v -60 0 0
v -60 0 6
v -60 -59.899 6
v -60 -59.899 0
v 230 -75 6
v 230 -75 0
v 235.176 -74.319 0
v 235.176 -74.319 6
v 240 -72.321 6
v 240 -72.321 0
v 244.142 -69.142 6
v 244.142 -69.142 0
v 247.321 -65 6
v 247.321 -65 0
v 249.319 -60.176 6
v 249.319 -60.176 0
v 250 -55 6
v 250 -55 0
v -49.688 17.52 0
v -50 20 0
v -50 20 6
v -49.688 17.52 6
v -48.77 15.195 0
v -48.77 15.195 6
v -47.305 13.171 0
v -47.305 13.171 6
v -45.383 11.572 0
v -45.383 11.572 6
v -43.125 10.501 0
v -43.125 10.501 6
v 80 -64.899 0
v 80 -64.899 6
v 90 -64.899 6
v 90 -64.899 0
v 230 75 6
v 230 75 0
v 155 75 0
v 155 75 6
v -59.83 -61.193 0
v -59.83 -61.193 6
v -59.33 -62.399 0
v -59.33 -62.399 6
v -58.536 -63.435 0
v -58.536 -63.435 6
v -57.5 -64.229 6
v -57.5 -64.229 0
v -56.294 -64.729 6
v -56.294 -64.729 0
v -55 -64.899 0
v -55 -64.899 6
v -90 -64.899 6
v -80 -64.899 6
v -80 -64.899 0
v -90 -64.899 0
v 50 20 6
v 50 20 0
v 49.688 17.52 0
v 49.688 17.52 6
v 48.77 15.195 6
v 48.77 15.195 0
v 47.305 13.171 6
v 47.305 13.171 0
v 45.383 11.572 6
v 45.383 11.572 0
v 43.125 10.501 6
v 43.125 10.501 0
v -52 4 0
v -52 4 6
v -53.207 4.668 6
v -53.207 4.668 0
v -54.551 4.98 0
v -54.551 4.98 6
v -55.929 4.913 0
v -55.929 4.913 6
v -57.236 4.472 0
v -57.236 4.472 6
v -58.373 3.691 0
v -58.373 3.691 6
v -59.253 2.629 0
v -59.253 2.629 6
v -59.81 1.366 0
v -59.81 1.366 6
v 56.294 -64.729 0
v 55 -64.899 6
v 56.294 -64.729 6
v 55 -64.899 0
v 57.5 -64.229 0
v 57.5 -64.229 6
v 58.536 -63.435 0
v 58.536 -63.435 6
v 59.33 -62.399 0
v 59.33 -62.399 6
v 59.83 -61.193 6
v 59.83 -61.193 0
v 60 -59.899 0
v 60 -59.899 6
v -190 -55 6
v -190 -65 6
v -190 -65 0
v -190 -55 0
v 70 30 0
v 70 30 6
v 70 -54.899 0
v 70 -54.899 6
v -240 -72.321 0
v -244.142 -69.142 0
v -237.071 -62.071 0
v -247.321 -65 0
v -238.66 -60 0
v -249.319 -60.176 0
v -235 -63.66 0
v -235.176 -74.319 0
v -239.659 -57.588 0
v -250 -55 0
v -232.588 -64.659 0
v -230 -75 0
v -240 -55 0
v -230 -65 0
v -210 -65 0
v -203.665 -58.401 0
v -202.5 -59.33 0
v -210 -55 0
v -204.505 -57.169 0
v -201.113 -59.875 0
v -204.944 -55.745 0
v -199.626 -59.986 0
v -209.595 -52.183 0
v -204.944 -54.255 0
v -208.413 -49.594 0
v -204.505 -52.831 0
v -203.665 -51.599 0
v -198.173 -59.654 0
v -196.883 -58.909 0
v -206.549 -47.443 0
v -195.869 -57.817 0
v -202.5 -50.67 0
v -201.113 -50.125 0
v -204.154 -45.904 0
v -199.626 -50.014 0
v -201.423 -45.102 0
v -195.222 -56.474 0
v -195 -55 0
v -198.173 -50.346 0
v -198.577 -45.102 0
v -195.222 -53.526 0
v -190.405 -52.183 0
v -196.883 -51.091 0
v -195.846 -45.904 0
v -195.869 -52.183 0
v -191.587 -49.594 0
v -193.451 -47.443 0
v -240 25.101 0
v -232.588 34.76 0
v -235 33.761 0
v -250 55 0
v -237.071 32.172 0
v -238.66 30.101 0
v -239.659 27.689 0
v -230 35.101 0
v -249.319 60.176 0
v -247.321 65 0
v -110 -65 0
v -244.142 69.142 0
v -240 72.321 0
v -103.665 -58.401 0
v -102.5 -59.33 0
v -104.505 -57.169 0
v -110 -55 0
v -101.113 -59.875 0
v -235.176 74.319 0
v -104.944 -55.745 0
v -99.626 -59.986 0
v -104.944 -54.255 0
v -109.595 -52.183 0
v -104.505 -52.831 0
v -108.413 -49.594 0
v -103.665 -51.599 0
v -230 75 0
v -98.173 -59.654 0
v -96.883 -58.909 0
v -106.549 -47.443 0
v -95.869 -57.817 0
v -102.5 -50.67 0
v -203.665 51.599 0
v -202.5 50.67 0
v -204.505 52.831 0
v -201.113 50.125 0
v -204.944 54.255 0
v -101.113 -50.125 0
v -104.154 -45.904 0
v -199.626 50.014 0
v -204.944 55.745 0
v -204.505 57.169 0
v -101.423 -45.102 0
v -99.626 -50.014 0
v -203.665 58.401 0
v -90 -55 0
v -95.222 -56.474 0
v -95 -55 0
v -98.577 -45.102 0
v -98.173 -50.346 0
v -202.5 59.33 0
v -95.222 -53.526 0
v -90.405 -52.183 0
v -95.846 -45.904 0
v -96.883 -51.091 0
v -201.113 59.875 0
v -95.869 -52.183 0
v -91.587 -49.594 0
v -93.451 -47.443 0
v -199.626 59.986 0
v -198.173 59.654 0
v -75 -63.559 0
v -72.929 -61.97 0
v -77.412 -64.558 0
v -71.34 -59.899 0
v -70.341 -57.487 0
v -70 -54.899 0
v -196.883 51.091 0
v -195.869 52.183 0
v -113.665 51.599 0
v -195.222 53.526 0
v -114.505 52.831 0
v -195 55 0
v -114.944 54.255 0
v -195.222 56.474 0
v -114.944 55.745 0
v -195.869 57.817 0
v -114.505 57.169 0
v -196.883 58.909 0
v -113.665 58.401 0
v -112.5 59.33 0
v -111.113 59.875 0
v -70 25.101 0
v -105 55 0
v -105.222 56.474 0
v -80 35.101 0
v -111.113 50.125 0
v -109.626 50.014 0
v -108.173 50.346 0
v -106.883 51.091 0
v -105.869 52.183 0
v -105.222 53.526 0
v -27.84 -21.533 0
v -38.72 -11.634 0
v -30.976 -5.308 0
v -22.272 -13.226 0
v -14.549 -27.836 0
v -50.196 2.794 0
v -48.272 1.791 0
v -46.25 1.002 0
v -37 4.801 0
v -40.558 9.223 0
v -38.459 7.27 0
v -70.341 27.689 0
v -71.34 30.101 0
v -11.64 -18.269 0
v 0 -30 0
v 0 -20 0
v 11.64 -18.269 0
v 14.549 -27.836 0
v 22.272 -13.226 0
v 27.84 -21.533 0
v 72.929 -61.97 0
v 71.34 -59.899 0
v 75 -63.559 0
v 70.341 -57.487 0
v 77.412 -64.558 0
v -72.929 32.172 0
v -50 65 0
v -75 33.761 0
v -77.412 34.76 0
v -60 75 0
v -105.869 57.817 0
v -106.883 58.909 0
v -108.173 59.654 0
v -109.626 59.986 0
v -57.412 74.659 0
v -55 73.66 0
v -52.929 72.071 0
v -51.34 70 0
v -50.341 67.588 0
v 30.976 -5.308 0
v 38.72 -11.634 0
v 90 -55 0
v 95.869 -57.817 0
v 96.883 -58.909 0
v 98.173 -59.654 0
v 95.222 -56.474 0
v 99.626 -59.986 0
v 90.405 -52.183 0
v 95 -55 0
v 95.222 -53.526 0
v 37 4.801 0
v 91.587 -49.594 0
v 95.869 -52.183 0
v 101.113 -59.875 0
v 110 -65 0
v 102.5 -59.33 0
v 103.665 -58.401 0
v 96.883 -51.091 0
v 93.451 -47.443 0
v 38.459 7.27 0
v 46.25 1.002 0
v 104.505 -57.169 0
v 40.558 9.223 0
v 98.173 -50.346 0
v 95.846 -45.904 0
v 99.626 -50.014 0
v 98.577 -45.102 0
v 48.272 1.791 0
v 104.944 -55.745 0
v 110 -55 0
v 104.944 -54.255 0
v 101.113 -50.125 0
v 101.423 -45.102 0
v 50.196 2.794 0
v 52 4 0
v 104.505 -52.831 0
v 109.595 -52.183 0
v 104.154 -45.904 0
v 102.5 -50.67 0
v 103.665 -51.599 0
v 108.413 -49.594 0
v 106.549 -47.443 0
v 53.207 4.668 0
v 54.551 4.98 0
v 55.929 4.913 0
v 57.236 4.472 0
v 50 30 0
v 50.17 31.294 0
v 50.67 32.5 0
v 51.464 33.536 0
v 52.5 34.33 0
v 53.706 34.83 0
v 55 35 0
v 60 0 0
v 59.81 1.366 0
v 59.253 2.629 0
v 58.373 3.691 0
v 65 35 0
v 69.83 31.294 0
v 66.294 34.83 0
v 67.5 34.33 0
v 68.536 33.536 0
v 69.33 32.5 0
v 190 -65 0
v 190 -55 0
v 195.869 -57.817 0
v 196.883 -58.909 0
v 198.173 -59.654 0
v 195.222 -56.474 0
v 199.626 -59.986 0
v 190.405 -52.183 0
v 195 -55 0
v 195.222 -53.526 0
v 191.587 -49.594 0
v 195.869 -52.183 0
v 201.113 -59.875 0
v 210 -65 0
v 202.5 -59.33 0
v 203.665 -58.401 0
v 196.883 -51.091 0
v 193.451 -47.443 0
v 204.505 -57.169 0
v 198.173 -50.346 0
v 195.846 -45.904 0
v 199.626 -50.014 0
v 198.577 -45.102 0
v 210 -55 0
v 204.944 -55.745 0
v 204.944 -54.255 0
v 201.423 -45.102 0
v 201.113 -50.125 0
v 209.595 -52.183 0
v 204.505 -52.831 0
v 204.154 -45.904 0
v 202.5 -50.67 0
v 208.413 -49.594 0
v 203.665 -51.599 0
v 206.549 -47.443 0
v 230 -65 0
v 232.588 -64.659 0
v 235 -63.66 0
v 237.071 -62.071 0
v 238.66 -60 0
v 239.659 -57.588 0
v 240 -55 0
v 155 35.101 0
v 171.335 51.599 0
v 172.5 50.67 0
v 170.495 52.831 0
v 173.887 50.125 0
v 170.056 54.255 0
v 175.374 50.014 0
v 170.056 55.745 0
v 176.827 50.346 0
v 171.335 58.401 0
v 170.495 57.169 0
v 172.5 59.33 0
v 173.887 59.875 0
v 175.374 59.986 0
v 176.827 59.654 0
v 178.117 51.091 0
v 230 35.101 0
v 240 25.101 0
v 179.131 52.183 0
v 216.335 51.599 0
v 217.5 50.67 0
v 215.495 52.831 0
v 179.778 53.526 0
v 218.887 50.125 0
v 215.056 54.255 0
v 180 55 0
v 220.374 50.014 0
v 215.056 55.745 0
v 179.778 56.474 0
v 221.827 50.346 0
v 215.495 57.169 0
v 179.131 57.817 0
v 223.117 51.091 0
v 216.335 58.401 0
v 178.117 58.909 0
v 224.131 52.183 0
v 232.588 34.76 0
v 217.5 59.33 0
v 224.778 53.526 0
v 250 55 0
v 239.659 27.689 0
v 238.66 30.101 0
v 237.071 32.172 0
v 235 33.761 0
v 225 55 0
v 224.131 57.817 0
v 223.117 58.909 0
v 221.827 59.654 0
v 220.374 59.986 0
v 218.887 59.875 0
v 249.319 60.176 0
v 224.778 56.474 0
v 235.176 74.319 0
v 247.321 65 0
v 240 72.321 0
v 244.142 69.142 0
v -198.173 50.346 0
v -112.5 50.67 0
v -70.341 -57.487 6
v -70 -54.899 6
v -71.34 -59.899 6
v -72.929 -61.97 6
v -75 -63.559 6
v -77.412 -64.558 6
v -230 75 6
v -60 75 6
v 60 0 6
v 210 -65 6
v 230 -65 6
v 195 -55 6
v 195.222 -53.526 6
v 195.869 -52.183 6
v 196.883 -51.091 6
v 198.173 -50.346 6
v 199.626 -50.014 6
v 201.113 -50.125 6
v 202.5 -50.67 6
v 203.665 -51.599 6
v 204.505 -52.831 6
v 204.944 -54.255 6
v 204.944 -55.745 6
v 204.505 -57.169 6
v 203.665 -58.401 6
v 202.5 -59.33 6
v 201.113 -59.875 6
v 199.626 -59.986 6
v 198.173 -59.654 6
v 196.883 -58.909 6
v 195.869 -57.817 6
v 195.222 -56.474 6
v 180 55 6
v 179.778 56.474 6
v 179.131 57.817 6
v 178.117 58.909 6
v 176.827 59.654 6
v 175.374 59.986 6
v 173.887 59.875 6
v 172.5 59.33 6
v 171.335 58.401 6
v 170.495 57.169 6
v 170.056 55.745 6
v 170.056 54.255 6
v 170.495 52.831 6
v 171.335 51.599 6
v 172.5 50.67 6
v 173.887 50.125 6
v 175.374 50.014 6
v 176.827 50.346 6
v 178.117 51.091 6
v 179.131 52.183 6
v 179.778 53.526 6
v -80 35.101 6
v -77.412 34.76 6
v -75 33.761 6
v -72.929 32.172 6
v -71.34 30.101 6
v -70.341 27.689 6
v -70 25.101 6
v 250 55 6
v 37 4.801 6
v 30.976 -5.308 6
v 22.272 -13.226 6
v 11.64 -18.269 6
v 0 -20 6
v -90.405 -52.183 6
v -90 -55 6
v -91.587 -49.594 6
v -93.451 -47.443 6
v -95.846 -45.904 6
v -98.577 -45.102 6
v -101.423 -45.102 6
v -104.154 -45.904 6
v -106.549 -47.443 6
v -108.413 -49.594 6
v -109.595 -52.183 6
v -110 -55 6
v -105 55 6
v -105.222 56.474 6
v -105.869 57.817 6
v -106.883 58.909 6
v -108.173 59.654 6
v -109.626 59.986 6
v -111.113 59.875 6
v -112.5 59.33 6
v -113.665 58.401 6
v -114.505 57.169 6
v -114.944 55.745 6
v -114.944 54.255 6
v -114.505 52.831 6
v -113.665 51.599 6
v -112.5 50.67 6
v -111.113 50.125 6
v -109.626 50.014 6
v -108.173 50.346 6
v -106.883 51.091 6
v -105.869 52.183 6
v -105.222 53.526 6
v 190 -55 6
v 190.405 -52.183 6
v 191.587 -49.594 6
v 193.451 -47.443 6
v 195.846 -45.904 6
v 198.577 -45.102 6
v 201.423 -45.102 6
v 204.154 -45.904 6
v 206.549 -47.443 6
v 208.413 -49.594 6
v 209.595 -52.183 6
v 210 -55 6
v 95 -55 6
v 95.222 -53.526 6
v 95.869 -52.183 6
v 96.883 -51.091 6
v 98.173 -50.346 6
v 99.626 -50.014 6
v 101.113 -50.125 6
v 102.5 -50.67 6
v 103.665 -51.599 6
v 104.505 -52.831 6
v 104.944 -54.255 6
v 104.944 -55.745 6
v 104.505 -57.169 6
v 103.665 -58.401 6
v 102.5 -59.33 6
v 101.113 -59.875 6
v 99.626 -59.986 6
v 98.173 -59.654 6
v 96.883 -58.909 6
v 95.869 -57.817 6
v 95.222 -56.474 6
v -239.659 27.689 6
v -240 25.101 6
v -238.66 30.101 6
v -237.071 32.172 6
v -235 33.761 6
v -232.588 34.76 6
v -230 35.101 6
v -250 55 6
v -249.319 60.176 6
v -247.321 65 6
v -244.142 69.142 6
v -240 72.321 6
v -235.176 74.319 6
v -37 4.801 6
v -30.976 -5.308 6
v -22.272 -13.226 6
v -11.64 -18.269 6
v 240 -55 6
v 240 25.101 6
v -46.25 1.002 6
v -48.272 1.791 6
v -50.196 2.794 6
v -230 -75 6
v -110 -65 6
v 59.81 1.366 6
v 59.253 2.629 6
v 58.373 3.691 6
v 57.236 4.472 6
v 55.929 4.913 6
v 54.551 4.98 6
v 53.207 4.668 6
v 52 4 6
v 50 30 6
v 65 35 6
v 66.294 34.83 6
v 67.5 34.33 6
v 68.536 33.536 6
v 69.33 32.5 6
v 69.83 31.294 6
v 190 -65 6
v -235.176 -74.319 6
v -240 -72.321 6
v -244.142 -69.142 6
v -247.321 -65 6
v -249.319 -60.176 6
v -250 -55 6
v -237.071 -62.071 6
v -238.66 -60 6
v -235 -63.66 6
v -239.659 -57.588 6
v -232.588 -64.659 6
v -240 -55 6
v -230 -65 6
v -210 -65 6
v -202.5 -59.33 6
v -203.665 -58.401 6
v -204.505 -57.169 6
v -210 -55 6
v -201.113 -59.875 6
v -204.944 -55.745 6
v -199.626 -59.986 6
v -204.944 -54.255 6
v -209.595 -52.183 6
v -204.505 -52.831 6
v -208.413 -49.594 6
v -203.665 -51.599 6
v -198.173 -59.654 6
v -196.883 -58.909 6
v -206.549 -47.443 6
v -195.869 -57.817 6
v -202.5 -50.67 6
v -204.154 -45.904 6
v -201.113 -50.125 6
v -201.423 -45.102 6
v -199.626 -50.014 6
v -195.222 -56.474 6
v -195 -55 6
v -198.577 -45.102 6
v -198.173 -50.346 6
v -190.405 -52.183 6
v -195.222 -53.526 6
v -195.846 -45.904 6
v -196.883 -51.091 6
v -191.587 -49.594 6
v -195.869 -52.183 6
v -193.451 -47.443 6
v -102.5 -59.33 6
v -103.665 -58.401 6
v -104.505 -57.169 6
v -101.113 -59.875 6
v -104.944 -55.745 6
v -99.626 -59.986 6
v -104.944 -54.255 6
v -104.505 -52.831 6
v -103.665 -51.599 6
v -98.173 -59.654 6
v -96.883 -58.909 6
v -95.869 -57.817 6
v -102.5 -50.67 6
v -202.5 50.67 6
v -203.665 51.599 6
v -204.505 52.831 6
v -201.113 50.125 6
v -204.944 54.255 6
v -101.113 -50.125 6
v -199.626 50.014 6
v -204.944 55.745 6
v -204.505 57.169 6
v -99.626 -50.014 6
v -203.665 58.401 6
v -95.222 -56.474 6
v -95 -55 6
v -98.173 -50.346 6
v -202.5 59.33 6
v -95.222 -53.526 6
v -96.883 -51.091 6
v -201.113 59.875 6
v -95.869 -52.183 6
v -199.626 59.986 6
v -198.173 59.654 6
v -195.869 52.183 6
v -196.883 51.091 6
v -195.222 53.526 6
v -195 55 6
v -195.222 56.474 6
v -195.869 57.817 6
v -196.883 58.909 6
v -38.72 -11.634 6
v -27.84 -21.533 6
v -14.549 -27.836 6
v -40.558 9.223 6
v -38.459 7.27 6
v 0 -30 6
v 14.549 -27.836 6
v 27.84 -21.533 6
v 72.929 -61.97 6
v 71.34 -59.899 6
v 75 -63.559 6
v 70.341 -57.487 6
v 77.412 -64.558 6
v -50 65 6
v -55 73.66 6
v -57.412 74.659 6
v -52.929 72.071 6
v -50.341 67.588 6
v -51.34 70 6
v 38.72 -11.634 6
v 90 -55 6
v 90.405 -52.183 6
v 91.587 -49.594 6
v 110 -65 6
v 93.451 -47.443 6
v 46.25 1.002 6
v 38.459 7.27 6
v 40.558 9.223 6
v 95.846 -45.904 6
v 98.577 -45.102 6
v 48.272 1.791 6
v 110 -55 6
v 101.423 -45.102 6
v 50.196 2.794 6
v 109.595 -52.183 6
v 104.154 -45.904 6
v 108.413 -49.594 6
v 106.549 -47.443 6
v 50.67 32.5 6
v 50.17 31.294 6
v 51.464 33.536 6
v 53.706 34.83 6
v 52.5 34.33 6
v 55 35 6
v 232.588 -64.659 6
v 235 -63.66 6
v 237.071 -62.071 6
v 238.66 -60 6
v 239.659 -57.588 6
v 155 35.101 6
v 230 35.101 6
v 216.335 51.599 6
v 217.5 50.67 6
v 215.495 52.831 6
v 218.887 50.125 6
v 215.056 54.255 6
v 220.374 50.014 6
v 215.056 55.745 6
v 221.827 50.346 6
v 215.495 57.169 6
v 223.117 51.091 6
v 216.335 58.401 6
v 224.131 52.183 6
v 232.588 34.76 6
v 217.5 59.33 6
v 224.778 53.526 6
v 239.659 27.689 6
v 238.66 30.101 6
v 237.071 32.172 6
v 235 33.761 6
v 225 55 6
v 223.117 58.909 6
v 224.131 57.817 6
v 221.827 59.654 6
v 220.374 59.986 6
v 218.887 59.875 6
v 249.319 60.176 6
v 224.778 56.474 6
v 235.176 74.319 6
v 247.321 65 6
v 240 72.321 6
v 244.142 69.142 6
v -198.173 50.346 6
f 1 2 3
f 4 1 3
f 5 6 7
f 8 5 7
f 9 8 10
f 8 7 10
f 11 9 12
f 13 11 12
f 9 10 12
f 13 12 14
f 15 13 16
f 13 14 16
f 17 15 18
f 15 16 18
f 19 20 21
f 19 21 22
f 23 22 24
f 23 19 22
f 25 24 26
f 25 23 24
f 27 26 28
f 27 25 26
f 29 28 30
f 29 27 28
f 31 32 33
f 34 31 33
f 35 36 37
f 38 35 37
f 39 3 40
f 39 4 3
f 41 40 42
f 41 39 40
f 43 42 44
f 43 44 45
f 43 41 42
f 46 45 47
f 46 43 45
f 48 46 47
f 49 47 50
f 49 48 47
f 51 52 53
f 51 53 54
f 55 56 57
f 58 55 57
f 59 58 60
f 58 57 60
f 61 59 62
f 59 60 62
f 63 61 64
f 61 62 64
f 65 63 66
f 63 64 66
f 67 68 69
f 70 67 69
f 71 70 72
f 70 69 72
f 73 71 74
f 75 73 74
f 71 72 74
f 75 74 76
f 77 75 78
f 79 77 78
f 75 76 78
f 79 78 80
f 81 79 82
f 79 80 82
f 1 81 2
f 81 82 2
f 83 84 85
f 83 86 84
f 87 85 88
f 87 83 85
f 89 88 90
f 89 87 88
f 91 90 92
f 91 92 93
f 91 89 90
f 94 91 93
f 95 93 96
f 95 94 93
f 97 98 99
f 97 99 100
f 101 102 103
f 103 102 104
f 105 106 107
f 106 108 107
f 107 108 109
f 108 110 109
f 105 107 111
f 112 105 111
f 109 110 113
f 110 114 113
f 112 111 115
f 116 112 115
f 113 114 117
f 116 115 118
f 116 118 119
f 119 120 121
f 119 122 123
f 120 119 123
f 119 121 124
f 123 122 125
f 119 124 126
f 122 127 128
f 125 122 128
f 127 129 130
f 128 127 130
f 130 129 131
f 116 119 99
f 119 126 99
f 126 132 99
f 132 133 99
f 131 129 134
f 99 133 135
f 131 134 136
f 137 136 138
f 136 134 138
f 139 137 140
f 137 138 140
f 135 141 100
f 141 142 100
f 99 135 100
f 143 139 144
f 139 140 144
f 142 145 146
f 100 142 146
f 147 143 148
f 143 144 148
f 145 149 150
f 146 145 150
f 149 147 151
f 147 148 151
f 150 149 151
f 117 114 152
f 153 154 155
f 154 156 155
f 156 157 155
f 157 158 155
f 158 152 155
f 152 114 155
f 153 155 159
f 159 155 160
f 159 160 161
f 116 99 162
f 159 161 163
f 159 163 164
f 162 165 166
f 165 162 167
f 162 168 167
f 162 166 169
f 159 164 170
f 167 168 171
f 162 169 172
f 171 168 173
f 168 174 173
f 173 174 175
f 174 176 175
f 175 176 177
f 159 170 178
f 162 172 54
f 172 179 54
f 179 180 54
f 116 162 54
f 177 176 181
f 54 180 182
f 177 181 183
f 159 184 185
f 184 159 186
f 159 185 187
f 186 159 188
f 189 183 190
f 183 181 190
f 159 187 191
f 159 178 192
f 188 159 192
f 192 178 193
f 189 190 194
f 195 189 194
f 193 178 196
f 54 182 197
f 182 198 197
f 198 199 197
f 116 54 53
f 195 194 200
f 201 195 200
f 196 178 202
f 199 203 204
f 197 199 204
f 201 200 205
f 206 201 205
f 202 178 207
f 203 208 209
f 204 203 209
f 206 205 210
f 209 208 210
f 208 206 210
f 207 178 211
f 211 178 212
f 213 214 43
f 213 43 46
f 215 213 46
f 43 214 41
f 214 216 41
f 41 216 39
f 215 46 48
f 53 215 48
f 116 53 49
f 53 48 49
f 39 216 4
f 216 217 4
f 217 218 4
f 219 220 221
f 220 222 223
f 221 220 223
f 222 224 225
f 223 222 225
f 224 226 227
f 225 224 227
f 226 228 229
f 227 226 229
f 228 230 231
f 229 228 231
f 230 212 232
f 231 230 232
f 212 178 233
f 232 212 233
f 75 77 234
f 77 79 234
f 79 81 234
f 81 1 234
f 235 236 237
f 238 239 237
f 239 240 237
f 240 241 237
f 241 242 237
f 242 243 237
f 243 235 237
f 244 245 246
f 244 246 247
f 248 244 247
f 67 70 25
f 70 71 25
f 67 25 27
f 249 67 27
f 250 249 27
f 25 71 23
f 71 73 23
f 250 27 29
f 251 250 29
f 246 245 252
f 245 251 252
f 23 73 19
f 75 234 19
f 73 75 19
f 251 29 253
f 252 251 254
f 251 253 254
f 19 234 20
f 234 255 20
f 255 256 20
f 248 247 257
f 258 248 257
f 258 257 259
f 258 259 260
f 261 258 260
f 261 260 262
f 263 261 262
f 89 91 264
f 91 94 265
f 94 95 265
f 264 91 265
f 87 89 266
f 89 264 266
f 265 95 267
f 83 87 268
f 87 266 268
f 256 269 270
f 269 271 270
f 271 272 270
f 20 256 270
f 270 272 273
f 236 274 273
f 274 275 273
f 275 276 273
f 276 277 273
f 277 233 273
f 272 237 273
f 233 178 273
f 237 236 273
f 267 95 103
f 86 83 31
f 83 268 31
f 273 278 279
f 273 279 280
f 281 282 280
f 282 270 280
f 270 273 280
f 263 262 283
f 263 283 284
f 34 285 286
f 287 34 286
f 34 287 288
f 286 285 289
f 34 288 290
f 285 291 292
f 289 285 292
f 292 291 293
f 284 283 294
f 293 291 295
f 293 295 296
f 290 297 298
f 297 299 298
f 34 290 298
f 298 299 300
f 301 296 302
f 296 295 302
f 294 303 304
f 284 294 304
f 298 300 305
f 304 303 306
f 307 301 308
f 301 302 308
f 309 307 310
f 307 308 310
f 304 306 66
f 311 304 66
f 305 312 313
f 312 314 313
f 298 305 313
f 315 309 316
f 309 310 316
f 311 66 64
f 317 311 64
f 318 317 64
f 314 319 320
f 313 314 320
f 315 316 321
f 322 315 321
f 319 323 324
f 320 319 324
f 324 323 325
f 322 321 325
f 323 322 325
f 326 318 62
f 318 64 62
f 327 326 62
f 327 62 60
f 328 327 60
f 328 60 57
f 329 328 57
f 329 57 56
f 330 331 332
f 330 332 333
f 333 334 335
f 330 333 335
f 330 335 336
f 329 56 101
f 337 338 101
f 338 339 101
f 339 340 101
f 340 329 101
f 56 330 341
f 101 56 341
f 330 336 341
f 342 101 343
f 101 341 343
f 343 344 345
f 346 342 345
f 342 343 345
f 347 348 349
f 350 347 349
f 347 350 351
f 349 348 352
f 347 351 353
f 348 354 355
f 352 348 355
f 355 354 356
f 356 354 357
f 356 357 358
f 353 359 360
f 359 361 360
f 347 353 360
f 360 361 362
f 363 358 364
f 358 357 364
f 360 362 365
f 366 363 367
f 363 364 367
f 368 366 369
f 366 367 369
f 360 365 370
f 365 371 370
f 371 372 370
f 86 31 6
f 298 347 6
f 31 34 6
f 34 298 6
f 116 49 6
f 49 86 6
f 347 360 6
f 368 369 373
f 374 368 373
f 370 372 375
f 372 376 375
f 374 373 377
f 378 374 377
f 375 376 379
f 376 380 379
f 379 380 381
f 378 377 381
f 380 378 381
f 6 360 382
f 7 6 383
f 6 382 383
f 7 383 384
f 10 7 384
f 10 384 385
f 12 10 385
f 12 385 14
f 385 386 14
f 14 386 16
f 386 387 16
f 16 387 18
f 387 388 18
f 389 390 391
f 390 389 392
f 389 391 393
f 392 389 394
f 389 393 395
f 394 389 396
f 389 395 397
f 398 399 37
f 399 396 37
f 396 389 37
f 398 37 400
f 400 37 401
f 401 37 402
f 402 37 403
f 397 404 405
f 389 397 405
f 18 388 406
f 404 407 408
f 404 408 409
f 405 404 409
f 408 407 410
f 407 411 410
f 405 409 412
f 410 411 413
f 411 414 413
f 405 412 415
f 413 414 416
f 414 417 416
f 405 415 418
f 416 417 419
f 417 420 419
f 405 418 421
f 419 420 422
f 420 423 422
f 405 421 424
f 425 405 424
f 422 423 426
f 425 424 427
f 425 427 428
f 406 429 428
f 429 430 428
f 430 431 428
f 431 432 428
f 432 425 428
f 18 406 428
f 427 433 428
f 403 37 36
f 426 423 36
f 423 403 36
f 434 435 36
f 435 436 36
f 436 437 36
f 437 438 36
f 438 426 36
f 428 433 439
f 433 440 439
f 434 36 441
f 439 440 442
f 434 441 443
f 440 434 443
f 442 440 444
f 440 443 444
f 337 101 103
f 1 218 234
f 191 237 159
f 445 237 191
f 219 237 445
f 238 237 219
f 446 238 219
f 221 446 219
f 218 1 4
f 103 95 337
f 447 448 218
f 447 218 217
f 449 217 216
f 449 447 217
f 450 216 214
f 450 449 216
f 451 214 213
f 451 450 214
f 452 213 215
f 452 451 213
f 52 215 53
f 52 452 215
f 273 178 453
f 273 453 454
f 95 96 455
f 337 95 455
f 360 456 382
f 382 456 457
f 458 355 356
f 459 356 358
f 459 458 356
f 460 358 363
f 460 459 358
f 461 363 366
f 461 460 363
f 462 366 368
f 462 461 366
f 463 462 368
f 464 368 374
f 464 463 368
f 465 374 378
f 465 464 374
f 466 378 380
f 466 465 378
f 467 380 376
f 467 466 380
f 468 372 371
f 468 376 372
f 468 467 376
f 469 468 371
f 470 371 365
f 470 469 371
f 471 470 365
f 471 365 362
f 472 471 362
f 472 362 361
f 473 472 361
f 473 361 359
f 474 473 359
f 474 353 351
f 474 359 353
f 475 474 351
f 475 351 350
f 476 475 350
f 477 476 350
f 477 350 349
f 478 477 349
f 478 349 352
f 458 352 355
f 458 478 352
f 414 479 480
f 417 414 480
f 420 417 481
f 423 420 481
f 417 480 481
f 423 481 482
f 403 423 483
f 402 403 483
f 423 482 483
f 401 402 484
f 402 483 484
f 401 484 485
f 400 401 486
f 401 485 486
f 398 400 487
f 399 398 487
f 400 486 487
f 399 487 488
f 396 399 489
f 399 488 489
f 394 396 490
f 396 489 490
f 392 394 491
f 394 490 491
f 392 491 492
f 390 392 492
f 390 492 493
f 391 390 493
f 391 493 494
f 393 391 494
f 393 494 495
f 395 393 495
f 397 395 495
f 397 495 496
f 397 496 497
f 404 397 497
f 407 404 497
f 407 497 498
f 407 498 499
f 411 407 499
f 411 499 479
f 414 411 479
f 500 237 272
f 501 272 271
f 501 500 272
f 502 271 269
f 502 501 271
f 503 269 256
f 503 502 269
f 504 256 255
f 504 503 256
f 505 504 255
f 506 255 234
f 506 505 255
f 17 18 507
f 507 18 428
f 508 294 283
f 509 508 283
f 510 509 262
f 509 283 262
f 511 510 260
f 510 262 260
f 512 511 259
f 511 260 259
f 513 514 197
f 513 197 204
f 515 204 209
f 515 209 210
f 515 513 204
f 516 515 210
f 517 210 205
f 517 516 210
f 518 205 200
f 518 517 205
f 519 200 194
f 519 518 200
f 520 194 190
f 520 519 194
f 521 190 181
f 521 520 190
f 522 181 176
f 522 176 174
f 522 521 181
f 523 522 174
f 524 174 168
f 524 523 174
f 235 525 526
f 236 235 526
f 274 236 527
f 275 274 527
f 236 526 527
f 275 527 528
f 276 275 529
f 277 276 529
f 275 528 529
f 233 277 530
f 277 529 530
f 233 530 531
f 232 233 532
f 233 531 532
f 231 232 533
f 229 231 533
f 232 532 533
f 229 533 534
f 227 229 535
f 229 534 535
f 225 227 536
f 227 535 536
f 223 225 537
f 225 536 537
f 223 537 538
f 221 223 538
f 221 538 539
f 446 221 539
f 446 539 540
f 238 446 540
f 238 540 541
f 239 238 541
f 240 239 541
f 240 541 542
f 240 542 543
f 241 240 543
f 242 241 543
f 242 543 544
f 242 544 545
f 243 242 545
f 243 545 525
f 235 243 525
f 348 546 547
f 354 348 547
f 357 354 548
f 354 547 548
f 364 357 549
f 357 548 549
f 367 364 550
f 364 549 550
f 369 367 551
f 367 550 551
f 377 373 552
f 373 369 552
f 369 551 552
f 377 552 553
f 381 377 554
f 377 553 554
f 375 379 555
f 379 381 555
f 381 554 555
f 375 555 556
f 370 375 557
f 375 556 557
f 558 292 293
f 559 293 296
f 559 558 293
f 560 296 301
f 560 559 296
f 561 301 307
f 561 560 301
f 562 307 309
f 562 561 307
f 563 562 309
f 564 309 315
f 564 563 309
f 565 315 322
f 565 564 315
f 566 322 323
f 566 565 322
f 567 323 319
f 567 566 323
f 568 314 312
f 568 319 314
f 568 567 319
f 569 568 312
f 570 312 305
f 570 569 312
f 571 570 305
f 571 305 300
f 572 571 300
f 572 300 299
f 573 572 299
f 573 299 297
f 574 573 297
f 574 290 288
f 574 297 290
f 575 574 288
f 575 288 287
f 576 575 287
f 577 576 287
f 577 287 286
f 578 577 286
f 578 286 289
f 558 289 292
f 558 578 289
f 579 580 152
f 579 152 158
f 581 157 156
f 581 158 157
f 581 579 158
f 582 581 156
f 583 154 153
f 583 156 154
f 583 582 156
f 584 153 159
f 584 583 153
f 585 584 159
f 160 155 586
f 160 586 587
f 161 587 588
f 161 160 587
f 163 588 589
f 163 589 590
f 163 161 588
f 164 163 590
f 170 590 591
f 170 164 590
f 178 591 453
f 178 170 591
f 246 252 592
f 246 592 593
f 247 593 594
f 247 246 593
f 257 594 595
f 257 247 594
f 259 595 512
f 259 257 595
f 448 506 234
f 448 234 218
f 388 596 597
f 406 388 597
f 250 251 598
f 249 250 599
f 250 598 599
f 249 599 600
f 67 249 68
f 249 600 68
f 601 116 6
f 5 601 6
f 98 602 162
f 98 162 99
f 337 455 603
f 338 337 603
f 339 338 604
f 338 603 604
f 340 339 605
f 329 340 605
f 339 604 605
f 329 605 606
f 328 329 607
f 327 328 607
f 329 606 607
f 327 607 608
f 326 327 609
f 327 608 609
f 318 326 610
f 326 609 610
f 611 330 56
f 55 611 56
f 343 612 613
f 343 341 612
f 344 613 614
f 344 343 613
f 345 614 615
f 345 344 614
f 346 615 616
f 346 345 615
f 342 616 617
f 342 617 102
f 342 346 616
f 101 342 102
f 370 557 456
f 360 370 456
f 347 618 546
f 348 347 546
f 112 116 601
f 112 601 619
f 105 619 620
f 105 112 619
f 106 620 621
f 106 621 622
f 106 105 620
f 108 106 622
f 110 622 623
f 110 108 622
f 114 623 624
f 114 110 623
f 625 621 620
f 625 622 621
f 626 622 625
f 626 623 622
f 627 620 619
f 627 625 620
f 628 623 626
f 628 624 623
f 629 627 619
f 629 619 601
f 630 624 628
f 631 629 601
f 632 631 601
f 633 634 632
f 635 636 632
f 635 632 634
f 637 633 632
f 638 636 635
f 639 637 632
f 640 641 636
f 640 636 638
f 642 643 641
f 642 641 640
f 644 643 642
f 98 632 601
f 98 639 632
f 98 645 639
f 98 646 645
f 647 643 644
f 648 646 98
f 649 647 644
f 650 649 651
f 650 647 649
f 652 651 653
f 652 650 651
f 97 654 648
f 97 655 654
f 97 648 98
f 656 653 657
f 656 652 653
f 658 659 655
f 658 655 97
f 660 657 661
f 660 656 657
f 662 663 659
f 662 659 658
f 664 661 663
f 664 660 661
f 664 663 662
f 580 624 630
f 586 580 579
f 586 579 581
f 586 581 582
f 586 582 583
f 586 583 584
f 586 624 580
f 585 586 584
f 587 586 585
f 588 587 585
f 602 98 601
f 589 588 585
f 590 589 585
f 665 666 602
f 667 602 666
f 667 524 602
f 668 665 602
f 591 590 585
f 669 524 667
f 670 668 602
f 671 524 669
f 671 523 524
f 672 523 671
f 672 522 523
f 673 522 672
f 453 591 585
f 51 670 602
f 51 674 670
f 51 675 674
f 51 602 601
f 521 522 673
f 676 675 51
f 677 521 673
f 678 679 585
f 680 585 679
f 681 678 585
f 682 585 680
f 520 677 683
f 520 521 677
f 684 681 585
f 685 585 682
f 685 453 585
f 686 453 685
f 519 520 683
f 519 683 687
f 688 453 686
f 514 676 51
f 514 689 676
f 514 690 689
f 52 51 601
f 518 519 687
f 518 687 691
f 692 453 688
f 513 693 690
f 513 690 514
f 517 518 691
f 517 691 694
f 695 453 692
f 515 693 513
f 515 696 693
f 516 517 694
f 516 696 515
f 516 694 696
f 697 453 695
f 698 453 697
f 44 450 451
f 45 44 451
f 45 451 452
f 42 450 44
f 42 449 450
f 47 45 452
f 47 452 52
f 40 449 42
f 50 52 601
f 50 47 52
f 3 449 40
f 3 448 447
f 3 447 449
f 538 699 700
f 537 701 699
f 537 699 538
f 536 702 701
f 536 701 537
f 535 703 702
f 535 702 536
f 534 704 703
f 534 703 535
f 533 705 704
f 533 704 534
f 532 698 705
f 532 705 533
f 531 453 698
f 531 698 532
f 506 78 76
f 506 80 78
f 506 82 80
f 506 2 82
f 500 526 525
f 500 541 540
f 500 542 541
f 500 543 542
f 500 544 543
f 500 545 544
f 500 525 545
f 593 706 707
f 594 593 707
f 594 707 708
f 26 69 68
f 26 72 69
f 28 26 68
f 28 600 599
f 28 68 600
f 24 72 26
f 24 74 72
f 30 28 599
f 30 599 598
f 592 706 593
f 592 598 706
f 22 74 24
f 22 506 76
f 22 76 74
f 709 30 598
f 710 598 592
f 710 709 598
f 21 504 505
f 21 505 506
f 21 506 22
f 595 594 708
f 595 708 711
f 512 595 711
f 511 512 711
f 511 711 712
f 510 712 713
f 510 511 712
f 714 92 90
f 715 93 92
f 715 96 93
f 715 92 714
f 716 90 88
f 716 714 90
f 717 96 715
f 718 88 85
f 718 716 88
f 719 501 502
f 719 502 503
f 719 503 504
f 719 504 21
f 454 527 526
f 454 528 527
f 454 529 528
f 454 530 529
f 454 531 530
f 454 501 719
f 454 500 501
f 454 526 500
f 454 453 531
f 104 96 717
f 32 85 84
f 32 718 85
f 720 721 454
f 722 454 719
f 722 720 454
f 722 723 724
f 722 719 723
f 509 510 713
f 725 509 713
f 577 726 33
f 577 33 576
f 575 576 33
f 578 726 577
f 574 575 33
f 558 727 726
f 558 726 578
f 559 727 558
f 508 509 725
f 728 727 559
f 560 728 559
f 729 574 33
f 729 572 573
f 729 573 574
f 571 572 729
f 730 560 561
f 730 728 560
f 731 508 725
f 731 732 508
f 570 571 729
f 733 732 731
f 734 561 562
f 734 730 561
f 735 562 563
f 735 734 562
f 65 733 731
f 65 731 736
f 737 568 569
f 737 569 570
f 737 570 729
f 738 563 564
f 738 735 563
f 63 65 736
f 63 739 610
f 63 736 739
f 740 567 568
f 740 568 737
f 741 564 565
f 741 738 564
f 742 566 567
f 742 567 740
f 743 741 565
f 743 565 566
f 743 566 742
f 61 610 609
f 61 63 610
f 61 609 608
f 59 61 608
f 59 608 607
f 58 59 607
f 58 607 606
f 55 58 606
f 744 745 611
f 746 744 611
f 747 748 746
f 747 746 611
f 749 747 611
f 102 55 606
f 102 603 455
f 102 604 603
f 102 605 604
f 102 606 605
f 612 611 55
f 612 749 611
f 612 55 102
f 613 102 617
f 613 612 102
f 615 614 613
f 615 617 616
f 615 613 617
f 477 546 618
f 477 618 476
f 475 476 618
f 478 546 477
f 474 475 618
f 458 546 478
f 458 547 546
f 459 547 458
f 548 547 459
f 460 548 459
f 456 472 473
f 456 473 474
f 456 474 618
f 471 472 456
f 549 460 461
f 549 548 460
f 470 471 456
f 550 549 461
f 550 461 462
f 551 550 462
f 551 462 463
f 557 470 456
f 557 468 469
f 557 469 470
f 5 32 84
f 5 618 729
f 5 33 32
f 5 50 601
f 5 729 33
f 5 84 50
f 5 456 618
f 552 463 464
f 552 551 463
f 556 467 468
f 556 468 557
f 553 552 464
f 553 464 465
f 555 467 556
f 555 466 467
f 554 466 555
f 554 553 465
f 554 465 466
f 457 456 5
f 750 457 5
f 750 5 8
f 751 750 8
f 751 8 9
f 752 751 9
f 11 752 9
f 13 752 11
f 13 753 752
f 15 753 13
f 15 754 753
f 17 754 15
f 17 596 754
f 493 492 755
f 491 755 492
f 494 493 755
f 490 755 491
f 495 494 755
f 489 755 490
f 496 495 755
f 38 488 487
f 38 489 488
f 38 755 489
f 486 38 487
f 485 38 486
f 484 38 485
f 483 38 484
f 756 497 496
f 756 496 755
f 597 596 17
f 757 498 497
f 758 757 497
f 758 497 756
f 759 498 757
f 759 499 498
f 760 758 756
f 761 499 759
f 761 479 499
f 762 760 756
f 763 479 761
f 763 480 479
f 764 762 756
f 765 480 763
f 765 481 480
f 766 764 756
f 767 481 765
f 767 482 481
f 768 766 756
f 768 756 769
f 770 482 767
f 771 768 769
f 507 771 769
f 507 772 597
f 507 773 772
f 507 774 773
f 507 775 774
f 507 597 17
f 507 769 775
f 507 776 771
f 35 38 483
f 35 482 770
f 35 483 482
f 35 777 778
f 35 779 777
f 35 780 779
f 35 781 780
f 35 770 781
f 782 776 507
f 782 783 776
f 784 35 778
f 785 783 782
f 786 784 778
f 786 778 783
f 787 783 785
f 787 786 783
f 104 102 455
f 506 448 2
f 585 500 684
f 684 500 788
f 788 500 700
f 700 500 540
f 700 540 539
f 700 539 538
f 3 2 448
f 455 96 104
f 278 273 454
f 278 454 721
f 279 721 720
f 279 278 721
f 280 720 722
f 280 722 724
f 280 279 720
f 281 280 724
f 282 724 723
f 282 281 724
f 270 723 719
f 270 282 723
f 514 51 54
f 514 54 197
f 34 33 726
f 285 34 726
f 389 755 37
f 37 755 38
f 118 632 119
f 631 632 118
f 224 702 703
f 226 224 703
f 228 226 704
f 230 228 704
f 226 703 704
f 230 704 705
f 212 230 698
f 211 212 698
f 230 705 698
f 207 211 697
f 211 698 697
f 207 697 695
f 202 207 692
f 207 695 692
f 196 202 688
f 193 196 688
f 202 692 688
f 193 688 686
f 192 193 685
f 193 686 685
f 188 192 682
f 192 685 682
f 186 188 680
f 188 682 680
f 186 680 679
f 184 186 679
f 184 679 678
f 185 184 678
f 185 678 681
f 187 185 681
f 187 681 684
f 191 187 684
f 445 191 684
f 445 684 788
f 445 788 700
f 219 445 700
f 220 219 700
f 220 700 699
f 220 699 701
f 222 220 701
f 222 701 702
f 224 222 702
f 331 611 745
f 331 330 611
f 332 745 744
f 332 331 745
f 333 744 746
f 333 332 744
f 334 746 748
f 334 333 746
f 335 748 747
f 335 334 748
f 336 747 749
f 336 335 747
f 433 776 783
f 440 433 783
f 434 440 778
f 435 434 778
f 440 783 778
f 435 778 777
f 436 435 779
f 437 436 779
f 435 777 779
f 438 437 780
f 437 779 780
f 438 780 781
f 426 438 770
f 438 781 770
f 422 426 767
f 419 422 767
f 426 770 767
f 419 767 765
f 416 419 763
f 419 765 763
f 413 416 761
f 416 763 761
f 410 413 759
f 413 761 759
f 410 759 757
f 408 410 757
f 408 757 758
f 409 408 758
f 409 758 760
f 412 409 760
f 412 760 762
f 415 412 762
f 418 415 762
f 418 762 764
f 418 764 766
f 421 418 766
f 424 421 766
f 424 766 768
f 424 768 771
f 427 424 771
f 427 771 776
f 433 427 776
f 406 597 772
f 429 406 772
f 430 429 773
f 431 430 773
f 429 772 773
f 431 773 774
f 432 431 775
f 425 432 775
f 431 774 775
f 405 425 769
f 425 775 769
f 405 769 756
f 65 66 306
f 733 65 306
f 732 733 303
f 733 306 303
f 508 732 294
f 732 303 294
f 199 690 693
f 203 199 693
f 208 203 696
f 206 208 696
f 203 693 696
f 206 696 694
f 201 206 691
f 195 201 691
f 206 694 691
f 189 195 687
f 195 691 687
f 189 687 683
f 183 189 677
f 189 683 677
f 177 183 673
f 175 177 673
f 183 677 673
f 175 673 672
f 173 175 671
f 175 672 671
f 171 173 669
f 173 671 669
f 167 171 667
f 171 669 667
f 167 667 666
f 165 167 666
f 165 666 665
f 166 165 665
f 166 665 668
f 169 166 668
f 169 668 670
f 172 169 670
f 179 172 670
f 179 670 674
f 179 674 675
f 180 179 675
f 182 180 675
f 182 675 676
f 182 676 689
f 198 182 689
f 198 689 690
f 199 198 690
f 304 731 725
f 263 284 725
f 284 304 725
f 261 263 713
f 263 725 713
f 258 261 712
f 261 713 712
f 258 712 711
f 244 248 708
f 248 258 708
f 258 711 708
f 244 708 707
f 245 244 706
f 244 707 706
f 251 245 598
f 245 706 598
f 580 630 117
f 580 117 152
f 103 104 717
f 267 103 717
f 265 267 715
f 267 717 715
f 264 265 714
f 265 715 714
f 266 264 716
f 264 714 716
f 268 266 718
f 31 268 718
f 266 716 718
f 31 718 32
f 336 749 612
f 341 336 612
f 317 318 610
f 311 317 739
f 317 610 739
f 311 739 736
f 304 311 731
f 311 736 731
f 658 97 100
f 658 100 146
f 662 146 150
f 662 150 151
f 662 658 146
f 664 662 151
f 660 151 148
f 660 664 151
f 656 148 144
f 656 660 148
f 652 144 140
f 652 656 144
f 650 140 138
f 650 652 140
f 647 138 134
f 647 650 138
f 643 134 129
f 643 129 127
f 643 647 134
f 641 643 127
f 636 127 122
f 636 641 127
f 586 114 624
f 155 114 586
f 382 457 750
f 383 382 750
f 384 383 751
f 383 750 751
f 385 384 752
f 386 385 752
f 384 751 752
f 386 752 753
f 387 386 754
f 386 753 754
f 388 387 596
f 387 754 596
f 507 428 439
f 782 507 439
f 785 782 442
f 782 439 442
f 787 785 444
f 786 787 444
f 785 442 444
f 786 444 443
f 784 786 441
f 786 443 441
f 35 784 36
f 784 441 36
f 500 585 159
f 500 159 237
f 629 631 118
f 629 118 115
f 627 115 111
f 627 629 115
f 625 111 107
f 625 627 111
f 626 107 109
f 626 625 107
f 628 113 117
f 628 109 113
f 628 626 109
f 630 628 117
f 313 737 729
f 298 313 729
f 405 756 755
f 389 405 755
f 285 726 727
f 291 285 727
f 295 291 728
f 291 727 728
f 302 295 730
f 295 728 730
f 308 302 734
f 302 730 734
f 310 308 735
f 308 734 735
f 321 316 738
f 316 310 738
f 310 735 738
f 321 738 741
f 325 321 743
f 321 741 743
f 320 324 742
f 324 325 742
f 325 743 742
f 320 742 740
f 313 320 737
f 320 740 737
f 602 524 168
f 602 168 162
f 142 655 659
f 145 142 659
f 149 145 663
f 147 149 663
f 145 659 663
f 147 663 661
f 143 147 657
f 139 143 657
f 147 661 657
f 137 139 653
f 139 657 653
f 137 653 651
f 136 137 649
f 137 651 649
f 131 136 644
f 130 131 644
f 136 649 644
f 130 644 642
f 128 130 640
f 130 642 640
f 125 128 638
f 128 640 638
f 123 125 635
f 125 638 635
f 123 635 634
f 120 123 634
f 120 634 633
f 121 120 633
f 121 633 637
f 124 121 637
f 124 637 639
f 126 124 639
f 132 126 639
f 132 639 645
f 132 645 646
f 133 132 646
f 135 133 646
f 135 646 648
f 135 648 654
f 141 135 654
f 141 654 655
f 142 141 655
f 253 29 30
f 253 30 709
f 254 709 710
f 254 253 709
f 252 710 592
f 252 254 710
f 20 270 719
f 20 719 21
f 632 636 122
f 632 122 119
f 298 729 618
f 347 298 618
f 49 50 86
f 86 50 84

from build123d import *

# Parameters (mm, degrees)
BOSS_EXTRUDE1_DEPTH = 6
SKETCH3_R           = 5
CUT_EXTRUDE1_DEPTH  = 262.076617107
SKETCH4_R           = 5
CUT_EXTRUDE2_DEPTH  = 262.076617107
FILLET4_R           = 5
CUT_EXTRUDE5_DEPTH  = 262.076617107
FILLET5_R           = 5
FILLET6_R           = 5
CUT_EXTRUDE6_DEPTH  = 262.076617107
FILLET7_R           = 5


with BuildPart() as part:
    # Sketch1 → Boss-Extrude1 (new body)
    with BuildSketch(Plane.XY):
        with BuildLine():
            Line((-250, -55), (-250, 3.178280867))
            Line((-250, 3.178280867), (-250, 55))
            ThreePointArc((-250, 55), (-244.142135624, 69.142135624), (-230, 75))
            Line((-230, 75), (-220, 75))
            Line((-220, 75), (-164.330865428, 75))
            Line((-164.330865428, 75), (-60, 75))
            ThreePointArc((-60, 75), (-52.928932188, 72.071067812), (-50, 65))
            Line((-50, 65), (-50, 20))
            ThreePointArc((-50, 20), (-48.100925873, 14.1369803), (-43.125, 10.500822404))
            ThreePointArc((-43.125, 10.500822404), (-39.437786703, 8.32242004), (-37, 4.801315846))
            ThreePointArc((-37, 4.801315846), (-22.271648276, -13.226099426), (0, -20))
            Line((0, -20), (0, -40))
            Line((0, -40), (0, -65))
            Line((0, -65), (0, -75))
            Line((0, -75), (-230, -75))
            ThreePointArc((-230, -75), (-244.142135624, -69.142135624), (-250, -55))
        make_face()
    boss_extrude1 = extrude(amount=BOSS_EXTRUDE1_DEPTH)

    # Mirror1: Boss-Extrude1 across plane
    add(boss_extrude1.mirror(Plane(origin=(0, -20, 6), x_dir=(0, 0, 1), z_dir=(-1, 0, 0))))

    # Sketch3 → Cut-Extrude1 (cut, through all)
    with BuildSketch(Plane.XY.offset(6)):
        with BuildLine():
            Line((155, 35), (155, 75))
            Line((155, 75), (60, 75))
            ThreePointArc((60, 75), (52.928932188, 72.071067812), (50, 65))
            Line((50, 65), (50, 35))
            Line((50, 35), (155, 35))
        make_face()
        with Locations((175, 55)):
            Circle(SKETCH3_R)
        with Locations((220, 55)):
            Circle(SKETCH3_R)
        with Locations((-110, 55)):
            Circle(SKETCH3_R)
        with Locations((-200, 55)):
            Circle(SKETCH3_R)
    extrude(amount=-CUT_EXTRUDE1_DEPTH, mode=Mode.SUBTRACT)

    # Sketch4 → Cut-Extrude2 (cut, through all)
    with BuildSketch(Plane.XY.offset(6)):
        with Locations((-200, -55)):
            Circle(SKETCH4_R)
        with Locations((-100, -55)):
            Circle(SKETCH4_R)
        with BuildLine():
            Line((-70, 25.100979079), (-70, -54.899020921))
            ThreePointArc((-70, -54.899020921), (-72.928932188, -61.970088733), (-80, -64.899020921))
            Line((-80, -64.899020921), (-90, -64.899020921))
            Line((-90, -64.899020921), (-90, -55))
            ThreePointArc((-90, -55), (-100, -45), (-110, -55))
            Line((-110, -55), (-110, -65))
            Line((-110, -65), (-190, -65))
            Line((-190, -65), (-190, -55))
            ThreePointArc((-190, -55), (-200, -45), (-210, -55))
            Line((-210, -55), (-210, -65))
            Line((-210, -65), (-230, -65))
            ThreePointArc((-230, -65), (-237.071067812, -62.071067812), (-240, -55))
            Line((-240, -55), (-240, 25.100979079))
            ThreePointArc((-240, 25.100979079), (-237.071067812, 32.17204689), (-230, 35.100979079))
            Line((-230, 35.100979079), (-140, 35.100979079))
            Line((-140, 35.100979079), (-110, 35.100979079))
            Line((-110, 35.100979079), (-80, 35.100979079))
            ThreePointArc((-80, 35.100979079), (-72.928932188, 32.17204689), (-70, 25.100979079))
        make_face()
    cut_extrude2 = extrude(amount=-CUT_EXTRUDE2_DEPTH, mode=Mode.SUBTRACT)

    # Mirror2: Cut-Extrude2 across plane
    add(cut_extrude2.mirror(Plane(origin=(0, 0, 0), x_dir=(0, 0, 1), z_dir=(1, 0, 0))), mode=Mode.SUBTRACT)

    # Fillet4
    fillet4_edges = [part.edges().sort_by_distance(p)[0] for p in [
        (50, 35, 3),
    ]]
    fillet(fillet4_edges, radius=FILLET4_R)

    # Sketch8 → Cut-Extrude5 (cut, through all)
    with BuildSketch(Plane.XY.offset(6)):
        with BuildLine():
            Line((-60, 0), (-60, -64.899020921))
            Line((-60, -64.899020921), (60, -64.899020921))
            Line((60, -64.899020921), (60, 0))
            ThreePointArc((60, 0), (57.236067977, 4.472135955), (52, 4))
            ThreePointArc((52, 4), (49.247332505, 2.266223145), (46.25, 1.001644808))
            ThreePointArc((46.25, 1.001644808), (0, -30), (-46.25, 1.001644808))
            ThreePointArc((-46.25, 1.001644808), (-49.247332505, 2.266223145), (-52, 4))
            ThreePointArc((-52, 4), (-57.236067977, 4.472135955), (-60, 0))
        make_face()
    extrude(amount=-CUT_EXTRUDE5_DEPTH, mode=Mode.SUBTRACT)

    # Fillet5
    fillet5_edges = [part.edges().sort_by_distance(p)[0] for p in [
        (-60, -64.899020921, 3),
    ]]
    fillet(fillet5_edges, radius=FILLET5_R)

    # Fillet6
    fillet6_edges = [part.edges().sort_by_distance(p)[0] for p in [
        (60, -64.899020921, 3),
    ]]
    fillet(fillet6_edges, radius=FILLET6_R)

    # Sketch9 → Cut-Extrude6 (cut, through all)
    with BuildSketch(Plane.XY.offset(6)):
        with BuildLine():
            Line((78.582472294, 35), (70, 35))
            Line((70, 35), (70, 25.100979079))
            ThreePointArc((70, 25.100979079), (72.444363791, 31.651731819), (78.582472294, 35))
        make_face()
    extrude(amount=-CUT_EXTRUDE6_DEPTH, mode=Mode.SUBTRACT)

    # Fillet7
    fillet7_edges = [part.edges().sort_by_distance(p)[0] for p in [
        (70, 35, 3),
    ]]
    fillet(fillet7_edges, radius=FILLET7_R)


solid = part.part
